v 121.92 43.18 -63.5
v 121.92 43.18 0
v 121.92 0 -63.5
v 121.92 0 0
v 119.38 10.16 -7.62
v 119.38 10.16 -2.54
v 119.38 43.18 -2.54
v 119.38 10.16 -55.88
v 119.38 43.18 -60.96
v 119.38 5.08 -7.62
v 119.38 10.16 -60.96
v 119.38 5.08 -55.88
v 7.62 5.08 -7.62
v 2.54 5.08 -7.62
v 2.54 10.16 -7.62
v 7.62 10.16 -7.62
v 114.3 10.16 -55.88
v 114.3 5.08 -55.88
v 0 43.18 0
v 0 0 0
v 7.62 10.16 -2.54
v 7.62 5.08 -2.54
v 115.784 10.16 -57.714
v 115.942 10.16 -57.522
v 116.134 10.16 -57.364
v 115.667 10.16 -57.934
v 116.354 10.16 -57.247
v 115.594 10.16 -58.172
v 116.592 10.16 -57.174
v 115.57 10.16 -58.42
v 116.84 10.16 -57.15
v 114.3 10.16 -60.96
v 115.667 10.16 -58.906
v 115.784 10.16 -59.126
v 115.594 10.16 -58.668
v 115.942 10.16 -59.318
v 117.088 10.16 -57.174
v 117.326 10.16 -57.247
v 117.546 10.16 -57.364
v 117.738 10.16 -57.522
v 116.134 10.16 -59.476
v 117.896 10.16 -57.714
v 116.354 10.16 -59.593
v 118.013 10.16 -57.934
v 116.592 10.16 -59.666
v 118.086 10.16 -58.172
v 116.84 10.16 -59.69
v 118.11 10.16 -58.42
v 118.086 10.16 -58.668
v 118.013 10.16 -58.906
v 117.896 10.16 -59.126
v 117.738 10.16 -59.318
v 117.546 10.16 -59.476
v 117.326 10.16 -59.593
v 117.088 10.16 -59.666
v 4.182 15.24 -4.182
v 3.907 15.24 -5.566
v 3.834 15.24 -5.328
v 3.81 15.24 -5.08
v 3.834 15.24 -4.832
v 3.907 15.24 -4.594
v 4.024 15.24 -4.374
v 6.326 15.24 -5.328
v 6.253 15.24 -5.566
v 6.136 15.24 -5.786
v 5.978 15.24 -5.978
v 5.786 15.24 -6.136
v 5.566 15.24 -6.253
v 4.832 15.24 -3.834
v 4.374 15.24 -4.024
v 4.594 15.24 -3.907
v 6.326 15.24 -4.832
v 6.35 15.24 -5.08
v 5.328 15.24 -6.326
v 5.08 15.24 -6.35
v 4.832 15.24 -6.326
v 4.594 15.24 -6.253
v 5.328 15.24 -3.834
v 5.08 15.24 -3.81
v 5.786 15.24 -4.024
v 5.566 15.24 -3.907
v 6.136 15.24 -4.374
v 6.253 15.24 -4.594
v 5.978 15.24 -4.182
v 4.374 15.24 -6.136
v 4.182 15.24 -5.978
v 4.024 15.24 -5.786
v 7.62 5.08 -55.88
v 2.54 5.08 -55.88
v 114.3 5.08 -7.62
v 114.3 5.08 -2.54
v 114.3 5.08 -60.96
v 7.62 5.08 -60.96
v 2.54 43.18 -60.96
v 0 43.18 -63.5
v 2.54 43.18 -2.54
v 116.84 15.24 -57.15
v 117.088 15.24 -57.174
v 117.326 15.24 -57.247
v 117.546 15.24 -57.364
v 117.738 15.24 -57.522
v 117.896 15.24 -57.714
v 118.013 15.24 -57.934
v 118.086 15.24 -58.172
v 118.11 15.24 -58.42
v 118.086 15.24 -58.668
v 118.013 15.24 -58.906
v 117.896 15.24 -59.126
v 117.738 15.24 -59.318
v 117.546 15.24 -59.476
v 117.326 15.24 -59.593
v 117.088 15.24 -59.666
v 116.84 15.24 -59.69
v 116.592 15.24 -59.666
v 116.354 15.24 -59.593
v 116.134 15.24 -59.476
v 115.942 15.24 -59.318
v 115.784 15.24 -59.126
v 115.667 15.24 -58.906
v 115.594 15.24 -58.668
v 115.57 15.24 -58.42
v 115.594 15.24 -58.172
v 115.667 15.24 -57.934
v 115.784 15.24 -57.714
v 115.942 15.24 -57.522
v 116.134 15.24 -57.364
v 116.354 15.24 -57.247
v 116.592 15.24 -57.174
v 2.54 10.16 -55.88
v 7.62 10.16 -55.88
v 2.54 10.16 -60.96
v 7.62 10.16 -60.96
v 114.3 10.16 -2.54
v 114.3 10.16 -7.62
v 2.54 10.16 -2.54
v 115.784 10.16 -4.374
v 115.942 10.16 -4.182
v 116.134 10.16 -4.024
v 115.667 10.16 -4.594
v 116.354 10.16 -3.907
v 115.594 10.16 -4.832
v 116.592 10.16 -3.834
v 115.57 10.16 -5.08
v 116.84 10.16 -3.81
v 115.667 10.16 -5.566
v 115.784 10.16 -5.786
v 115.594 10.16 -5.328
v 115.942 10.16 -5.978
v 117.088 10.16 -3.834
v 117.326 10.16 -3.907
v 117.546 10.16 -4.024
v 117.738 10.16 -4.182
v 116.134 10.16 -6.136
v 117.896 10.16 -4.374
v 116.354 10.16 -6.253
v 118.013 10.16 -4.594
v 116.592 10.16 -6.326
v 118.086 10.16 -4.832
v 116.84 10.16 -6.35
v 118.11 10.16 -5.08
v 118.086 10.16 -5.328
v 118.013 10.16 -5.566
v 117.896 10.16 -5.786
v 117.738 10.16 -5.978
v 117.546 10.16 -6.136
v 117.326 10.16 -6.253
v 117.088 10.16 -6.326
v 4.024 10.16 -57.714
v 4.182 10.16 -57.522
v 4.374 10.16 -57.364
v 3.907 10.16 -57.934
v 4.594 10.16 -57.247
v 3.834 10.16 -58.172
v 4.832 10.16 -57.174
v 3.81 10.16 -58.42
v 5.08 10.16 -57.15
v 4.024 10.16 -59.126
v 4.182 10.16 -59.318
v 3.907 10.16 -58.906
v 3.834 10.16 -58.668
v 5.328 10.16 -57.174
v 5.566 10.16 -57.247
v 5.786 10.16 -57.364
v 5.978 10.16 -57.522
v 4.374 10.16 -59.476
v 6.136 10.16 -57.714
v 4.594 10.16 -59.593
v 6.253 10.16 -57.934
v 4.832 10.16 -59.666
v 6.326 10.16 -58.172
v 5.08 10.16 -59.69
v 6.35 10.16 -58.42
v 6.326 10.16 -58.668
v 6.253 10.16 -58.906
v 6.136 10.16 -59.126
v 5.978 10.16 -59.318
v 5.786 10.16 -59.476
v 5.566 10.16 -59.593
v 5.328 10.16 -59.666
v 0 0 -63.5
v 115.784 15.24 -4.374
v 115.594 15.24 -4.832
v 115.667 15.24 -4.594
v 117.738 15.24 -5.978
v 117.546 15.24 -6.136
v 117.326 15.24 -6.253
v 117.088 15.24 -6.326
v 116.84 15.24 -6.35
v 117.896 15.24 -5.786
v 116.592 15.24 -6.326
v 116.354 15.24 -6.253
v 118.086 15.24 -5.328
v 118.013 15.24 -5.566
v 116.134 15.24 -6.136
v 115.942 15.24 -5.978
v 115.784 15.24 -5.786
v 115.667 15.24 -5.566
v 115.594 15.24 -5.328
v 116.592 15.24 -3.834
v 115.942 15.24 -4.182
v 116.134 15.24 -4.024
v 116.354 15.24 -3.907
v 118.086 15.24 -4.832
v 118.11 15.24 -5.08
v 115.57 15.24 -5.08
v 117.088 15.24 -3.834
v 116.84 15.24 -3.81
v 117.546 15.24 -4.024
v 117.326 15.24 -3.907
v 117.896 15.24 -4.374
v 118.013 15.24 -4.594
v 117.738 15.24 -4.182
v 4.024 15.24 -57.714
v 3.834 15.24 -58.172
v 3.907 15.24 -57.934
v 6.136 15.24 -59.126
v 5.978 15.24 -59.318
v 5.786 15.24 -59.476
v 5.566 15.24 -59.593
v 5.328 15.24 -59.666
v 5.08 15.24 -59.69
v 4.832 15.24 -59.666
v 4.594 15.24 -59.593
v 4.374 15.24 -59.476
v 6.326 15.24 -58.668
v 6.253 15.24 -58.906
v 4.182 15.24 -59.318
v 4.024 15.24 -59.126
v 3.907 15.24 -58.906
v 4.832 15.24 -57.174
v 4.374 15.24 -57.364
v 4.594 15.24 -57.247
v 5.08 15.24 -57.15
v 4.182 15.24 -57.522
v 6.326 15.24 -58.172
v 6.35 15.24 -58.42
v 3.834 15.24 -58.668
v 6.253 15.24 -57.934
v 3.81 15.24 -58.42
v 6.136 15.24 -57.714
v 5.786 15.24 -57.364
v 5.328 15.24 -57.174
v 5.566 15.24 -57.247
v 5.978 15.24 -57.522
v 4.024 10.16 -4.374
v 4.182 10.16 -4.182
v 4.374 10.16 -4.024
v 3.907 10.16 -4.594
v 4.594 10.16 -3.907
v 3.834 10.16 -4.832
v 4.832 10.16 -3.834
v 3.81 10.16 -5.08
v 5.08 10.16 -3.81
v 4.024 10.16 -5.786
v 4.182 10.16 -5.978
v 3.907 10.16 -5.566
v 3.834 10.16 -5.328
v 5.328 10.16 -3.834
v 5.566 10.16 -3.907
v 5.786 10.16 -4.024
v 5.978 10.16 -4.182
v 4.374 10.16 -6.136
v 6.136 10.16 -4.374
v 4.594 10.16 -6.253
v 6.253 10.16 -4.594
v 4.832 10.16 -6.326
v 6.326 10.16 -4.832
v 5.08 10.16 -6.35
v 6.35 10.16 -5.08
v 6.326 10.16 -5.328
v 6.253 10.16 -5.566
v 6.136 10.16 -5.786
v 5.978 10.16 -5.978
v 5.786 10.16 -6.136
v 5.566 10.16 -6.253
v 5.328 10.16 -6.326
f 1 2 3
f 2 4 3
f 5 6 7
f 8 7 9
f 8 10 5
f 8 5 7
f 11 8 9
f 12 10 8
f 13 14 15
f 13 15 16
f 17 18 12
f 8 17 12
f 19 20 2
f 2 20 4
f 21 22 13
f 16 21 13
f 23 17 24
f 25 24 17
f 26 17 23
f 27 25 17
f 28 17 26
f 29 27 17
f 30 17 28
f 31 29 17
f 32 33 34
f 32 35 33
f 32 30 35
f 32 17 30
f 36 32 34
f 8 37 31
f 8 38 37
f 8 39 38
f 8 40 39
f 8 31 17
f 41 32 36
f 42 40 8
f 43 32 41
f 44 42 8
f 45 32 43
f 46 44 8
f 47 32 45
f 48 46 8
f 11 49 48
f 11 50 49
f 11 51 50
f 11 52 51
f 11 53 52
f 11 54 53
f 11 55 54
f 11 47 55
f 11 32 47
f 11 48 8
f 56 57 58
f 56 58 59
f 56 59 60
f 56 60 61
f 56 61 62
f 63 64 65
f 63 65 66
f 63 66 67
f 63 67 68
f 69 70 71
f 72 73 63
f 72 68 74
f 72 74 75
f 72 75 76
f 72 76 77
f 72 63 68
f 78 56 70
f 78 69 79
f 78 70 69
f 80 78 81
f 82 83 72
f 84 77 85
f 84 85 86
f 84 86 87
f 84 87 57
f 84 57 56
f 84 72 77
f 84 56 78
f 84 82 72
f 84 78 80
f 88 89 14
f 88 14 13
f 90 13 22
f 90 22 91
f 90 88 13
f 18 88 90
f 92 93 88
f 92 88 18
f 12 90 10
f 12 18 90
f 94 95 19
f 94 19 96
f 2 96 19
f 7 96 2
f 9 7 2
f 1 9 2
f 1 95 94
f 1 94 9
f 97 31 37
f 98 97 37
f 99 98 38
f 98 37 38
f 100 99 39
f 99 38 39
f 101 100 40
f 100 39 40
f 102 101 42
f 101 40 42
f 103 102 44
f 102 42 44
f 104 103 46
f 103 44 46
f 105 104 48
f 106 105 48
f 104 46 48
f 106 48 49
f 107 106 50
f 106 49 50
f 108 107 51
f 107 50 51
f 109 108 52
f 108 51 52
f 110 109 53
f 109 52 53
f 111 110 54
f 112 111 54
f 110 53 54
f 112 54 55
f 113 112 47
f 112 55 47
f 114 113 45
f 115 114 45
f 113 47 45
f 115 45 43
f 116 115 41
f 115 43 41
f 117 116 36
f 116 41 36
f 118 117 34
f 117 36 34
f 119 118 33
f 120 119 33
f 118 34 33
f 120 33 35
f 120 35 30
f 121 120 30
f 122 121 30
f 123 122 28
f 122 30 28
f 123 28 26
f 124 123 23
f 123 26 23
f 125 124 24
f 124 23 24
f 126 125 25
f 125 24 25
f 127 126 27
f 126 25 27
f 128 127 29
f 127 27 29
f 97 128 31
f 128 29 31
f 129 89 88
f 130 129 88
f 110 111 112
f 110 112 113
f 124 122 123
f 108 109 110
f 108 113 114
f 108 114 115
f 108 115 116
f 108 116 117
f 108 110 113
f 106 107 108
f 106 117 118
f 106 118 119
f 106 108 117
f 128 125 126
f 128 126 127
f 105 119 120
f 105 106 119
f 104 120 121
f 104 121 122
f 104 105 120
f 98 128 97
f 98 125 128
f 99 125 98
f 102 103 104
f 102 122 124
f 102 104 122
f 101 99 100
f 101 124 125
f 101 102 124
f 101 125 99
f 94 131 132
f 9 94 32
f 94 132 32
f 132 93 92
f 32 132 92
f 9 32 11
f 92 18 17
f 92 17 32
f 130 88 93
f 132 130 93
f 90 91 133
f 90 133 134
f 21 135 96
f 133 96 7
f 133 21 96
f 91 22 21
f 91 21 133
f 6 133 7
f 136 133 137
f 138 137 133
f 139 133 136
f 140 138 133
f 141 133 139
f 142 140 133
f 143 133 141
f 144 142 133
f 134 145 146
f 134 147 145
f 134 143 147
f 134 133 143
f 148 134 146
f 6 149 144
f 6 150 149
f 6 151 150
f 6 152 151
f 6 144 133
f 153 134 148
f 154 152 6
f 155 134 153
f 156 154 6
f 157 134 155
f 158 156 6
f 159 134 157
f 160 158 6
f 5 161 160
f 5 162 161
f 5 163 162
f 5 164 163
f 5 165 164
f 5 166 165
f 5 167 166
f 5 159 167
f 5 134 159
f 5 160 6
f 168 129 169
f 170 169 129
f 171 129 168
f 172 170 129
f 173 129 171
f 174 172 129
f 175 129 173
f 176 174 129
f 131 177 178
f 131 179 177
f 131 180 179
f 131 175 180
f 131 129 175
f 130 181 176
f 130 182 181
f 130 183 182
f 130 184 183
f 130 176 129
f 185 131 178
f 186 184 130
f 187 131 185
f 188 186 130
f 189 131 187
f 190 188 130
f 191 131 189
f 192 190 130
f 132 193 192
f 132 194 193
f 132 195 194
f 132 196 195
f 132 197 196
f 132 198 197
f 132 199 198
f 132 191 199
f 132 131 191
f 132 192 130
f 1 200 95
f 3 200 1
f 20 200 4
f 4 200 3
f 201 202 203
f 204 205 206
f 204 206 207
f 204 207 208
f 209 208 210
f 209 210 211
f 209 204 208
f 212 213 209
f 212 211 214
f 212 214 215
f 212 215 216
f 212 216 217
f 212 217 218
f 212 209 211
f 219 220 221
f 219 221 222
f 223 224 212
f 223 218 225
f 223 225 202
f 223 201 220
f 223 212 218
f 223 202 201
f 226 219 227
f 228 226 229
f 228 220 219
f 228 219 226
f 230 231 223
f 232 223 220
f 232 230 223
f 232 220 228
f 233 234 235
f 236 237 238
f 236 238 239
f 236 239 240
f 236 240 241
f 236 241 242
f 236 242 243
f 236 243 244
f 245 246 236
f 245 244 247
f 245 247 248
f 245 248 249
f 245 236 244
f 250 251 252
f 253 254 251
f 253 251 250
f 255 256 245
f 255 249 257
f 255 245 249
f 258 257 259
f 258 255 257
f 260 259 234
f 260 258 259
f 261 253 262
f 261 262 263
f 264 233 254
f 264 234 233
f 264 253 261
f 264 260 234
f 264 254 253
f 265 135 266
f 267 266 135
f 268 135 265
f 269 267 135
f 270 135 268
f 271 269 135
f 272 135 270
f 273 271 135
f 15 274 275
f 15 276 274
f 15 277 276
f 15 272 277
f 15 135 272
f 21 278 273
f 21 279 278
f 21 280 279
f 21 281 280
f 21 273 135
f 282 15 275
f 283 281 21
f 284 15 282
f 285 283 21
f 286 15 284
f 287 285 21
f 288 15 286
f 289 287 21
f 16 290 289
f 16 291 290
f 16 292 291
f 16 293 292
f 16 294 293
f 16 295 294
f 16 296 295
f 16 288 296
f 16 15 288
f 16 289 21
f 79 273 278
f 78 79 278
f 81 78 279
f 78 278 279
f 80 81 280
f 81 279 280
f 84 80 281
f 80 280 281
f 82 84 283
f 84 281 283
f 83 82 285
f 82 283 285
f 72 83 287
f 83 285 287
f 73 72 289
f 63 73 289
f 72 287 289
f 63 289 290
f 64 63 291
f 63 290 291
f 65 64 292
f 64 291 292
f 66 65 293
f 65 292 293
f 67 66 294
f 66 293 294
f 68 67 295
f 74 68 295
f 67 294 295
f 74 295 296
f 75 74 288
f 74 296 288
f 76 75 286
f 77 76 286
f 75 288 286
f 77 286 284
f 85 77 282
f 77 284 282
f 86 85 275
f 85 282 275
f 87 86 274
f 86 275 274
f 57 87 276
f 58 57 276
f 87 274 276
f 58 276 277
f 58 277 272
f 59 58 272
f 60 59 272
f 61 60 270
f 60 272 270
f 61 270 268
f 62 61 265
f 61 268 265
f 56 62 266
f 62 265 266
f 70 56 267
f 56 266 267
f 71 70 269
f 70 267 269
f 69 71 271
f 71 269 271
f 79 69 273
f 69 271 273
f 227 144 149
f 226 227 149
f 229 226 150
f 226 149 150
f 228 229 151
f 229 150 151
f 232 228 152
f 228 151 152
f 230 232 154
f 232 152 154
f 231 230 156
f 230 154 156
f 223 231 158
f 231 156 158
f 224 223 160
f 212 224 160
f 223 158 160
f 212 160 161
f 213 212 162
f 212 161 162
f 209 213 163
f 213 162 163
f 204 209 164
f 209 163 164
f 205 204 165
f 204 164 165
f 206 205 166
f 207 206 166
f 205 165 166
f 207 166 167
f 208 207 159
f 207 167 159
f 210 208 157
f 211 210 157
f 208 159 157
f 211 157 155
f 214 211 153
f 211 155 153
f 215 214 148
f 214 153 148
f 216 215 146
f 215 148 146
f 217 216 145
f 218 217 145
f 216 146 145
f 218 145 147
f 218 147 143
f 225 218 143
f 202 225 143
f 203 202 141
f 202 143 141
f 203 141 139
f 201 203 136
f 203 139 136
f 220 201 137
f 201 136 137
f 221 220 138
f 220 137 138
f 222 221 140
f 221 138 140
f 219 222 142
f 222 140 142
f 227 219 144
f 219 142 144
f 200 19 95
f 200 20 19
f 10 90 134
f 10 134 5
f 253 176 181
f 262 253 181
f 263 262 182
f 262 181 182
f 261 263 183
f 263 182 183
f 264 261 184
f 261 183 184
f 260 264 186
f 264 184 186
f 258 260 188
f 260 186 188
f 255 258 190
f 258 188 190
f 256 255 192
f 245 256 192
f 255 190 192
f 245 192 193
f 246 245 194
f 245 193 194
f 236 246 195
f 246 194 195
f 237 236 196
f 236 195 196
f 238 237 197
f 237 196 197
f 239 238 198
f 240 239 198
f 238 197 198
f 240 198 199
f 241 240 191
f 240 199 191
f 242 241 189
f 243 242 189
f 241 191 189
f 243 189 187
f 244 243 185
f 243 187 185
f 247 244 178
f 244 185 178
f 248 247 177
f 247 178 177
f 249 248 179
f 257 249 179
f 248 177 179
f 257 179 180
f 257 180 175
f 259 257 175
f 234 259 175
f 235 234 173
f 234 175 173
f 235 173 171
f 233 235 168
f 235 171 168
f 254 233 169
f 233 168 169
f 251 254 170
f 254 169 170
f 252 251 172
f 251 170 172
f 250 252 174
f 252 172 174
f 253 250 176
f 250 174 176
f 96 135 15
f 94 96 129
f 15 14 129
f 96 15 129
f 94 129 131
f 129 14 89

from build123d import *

# Parameters (mm, degrees)
SKETCH1_W           = 121.92
SKETCH1_H           = 63.5
BOSS_EXTRUDE1_DEPTH = 5.08
SKETCH2_W           = 121.92
SKETCH2_H           = 63.5
SKETCH2_W_2         = 116.84
SKETCH2_H_2         = 58.42
BOSS_EXTRUDE2_DEPTH = 38.1
SKETCH4_W           = 5.08
SKETCH4_H           = 5.08
BOSS_EXTRUDE3_DEPTH = 5.08
SKETCH5_R           = 1.27
BOSS_EXTRUDE4_DEPTH = 5.08


with BuildPart() as part:
    # Sketch1 → Boss-Extrude1 (new body)
    with BuildSketch(Plane(origin=(0, 0, 0), x_dir=(1, 0, 0), z_dir=(0, 1, 0))):
        with Locations((60.96, 31.75)):
            Rectangle(SKETCH1_W, SKETCH1_H)
    extrude(amount=BOSS_EXTRUDE1_DEPTH)

    # Sketch2 → Boss-Extrude2 (add)
    with BuildSketch(Plane(origin=(0, 5.08, 0), x_dir=(1, 0, 0), z_dir=(0, 1, 0))):
        with Locations((60.96, 31.75)):
            Rectangle(SKETCH2_W, SKETCH2_H)
        with Locations((60.96, 31.75)):
            Rectangle(SKETCH2_W_2, SKETCH2_H_2, mode=Mode.SUBTRACT)
    extrude(amount=BOSS_EXTRUDE2_DEPTH)

    # Sketch4 → Boss-Extrude3 (add)
    with BuildSketch(Plane(origin=(0, 5.08, 0), x_dir=(1, 0, 0), z_dir=(0, 1, 0))):
        with Locations((5.08, 58.42)):
            Rectangle(SKETCH4_W, SKETCH4_H)
        with Locations((116.84, 58.42)):
            Rectangle(SKETCH4_W, SKETCH4_H)
        with Locations((116.84, 5.08)):
            Rectangle(SKETCH4_W, SKETCH4_H)
        with Locations((5.08, 5.08)):
            Rectangle(SKETCH4_W, SKETCH4_H)
    extrude(amount=BOSS_EXTRUDE3_DEPTH)

    # Sketch5 → Boss-Extrude4 (add)
    with BuildSketch(Plane(origin=(0, 10.16, 0), x_dir=(1, 0, 0), z_dir=(0, 1, 0))):
        with Locations(Location((5.08, 58.42, 0), (0, 0, 270))):
            Circle(SKETCH5_R)
        with Locations(Location((116.84, 58.42, 0), (0, 0, 270))):
            Circle(SKETCH5_R)
        with Locations(Location((116.84, 5.08, 0), (0, 0, 270))):
            Circle(SKETCH5_R)
        with Locations(Location((5.08, 5.08, 0), (0, 0, 270))):
            Circle(SKETCH5_R)
    extrude(amount=BOSS_EXTRUDE4_DEPTH)


solid = part.part
